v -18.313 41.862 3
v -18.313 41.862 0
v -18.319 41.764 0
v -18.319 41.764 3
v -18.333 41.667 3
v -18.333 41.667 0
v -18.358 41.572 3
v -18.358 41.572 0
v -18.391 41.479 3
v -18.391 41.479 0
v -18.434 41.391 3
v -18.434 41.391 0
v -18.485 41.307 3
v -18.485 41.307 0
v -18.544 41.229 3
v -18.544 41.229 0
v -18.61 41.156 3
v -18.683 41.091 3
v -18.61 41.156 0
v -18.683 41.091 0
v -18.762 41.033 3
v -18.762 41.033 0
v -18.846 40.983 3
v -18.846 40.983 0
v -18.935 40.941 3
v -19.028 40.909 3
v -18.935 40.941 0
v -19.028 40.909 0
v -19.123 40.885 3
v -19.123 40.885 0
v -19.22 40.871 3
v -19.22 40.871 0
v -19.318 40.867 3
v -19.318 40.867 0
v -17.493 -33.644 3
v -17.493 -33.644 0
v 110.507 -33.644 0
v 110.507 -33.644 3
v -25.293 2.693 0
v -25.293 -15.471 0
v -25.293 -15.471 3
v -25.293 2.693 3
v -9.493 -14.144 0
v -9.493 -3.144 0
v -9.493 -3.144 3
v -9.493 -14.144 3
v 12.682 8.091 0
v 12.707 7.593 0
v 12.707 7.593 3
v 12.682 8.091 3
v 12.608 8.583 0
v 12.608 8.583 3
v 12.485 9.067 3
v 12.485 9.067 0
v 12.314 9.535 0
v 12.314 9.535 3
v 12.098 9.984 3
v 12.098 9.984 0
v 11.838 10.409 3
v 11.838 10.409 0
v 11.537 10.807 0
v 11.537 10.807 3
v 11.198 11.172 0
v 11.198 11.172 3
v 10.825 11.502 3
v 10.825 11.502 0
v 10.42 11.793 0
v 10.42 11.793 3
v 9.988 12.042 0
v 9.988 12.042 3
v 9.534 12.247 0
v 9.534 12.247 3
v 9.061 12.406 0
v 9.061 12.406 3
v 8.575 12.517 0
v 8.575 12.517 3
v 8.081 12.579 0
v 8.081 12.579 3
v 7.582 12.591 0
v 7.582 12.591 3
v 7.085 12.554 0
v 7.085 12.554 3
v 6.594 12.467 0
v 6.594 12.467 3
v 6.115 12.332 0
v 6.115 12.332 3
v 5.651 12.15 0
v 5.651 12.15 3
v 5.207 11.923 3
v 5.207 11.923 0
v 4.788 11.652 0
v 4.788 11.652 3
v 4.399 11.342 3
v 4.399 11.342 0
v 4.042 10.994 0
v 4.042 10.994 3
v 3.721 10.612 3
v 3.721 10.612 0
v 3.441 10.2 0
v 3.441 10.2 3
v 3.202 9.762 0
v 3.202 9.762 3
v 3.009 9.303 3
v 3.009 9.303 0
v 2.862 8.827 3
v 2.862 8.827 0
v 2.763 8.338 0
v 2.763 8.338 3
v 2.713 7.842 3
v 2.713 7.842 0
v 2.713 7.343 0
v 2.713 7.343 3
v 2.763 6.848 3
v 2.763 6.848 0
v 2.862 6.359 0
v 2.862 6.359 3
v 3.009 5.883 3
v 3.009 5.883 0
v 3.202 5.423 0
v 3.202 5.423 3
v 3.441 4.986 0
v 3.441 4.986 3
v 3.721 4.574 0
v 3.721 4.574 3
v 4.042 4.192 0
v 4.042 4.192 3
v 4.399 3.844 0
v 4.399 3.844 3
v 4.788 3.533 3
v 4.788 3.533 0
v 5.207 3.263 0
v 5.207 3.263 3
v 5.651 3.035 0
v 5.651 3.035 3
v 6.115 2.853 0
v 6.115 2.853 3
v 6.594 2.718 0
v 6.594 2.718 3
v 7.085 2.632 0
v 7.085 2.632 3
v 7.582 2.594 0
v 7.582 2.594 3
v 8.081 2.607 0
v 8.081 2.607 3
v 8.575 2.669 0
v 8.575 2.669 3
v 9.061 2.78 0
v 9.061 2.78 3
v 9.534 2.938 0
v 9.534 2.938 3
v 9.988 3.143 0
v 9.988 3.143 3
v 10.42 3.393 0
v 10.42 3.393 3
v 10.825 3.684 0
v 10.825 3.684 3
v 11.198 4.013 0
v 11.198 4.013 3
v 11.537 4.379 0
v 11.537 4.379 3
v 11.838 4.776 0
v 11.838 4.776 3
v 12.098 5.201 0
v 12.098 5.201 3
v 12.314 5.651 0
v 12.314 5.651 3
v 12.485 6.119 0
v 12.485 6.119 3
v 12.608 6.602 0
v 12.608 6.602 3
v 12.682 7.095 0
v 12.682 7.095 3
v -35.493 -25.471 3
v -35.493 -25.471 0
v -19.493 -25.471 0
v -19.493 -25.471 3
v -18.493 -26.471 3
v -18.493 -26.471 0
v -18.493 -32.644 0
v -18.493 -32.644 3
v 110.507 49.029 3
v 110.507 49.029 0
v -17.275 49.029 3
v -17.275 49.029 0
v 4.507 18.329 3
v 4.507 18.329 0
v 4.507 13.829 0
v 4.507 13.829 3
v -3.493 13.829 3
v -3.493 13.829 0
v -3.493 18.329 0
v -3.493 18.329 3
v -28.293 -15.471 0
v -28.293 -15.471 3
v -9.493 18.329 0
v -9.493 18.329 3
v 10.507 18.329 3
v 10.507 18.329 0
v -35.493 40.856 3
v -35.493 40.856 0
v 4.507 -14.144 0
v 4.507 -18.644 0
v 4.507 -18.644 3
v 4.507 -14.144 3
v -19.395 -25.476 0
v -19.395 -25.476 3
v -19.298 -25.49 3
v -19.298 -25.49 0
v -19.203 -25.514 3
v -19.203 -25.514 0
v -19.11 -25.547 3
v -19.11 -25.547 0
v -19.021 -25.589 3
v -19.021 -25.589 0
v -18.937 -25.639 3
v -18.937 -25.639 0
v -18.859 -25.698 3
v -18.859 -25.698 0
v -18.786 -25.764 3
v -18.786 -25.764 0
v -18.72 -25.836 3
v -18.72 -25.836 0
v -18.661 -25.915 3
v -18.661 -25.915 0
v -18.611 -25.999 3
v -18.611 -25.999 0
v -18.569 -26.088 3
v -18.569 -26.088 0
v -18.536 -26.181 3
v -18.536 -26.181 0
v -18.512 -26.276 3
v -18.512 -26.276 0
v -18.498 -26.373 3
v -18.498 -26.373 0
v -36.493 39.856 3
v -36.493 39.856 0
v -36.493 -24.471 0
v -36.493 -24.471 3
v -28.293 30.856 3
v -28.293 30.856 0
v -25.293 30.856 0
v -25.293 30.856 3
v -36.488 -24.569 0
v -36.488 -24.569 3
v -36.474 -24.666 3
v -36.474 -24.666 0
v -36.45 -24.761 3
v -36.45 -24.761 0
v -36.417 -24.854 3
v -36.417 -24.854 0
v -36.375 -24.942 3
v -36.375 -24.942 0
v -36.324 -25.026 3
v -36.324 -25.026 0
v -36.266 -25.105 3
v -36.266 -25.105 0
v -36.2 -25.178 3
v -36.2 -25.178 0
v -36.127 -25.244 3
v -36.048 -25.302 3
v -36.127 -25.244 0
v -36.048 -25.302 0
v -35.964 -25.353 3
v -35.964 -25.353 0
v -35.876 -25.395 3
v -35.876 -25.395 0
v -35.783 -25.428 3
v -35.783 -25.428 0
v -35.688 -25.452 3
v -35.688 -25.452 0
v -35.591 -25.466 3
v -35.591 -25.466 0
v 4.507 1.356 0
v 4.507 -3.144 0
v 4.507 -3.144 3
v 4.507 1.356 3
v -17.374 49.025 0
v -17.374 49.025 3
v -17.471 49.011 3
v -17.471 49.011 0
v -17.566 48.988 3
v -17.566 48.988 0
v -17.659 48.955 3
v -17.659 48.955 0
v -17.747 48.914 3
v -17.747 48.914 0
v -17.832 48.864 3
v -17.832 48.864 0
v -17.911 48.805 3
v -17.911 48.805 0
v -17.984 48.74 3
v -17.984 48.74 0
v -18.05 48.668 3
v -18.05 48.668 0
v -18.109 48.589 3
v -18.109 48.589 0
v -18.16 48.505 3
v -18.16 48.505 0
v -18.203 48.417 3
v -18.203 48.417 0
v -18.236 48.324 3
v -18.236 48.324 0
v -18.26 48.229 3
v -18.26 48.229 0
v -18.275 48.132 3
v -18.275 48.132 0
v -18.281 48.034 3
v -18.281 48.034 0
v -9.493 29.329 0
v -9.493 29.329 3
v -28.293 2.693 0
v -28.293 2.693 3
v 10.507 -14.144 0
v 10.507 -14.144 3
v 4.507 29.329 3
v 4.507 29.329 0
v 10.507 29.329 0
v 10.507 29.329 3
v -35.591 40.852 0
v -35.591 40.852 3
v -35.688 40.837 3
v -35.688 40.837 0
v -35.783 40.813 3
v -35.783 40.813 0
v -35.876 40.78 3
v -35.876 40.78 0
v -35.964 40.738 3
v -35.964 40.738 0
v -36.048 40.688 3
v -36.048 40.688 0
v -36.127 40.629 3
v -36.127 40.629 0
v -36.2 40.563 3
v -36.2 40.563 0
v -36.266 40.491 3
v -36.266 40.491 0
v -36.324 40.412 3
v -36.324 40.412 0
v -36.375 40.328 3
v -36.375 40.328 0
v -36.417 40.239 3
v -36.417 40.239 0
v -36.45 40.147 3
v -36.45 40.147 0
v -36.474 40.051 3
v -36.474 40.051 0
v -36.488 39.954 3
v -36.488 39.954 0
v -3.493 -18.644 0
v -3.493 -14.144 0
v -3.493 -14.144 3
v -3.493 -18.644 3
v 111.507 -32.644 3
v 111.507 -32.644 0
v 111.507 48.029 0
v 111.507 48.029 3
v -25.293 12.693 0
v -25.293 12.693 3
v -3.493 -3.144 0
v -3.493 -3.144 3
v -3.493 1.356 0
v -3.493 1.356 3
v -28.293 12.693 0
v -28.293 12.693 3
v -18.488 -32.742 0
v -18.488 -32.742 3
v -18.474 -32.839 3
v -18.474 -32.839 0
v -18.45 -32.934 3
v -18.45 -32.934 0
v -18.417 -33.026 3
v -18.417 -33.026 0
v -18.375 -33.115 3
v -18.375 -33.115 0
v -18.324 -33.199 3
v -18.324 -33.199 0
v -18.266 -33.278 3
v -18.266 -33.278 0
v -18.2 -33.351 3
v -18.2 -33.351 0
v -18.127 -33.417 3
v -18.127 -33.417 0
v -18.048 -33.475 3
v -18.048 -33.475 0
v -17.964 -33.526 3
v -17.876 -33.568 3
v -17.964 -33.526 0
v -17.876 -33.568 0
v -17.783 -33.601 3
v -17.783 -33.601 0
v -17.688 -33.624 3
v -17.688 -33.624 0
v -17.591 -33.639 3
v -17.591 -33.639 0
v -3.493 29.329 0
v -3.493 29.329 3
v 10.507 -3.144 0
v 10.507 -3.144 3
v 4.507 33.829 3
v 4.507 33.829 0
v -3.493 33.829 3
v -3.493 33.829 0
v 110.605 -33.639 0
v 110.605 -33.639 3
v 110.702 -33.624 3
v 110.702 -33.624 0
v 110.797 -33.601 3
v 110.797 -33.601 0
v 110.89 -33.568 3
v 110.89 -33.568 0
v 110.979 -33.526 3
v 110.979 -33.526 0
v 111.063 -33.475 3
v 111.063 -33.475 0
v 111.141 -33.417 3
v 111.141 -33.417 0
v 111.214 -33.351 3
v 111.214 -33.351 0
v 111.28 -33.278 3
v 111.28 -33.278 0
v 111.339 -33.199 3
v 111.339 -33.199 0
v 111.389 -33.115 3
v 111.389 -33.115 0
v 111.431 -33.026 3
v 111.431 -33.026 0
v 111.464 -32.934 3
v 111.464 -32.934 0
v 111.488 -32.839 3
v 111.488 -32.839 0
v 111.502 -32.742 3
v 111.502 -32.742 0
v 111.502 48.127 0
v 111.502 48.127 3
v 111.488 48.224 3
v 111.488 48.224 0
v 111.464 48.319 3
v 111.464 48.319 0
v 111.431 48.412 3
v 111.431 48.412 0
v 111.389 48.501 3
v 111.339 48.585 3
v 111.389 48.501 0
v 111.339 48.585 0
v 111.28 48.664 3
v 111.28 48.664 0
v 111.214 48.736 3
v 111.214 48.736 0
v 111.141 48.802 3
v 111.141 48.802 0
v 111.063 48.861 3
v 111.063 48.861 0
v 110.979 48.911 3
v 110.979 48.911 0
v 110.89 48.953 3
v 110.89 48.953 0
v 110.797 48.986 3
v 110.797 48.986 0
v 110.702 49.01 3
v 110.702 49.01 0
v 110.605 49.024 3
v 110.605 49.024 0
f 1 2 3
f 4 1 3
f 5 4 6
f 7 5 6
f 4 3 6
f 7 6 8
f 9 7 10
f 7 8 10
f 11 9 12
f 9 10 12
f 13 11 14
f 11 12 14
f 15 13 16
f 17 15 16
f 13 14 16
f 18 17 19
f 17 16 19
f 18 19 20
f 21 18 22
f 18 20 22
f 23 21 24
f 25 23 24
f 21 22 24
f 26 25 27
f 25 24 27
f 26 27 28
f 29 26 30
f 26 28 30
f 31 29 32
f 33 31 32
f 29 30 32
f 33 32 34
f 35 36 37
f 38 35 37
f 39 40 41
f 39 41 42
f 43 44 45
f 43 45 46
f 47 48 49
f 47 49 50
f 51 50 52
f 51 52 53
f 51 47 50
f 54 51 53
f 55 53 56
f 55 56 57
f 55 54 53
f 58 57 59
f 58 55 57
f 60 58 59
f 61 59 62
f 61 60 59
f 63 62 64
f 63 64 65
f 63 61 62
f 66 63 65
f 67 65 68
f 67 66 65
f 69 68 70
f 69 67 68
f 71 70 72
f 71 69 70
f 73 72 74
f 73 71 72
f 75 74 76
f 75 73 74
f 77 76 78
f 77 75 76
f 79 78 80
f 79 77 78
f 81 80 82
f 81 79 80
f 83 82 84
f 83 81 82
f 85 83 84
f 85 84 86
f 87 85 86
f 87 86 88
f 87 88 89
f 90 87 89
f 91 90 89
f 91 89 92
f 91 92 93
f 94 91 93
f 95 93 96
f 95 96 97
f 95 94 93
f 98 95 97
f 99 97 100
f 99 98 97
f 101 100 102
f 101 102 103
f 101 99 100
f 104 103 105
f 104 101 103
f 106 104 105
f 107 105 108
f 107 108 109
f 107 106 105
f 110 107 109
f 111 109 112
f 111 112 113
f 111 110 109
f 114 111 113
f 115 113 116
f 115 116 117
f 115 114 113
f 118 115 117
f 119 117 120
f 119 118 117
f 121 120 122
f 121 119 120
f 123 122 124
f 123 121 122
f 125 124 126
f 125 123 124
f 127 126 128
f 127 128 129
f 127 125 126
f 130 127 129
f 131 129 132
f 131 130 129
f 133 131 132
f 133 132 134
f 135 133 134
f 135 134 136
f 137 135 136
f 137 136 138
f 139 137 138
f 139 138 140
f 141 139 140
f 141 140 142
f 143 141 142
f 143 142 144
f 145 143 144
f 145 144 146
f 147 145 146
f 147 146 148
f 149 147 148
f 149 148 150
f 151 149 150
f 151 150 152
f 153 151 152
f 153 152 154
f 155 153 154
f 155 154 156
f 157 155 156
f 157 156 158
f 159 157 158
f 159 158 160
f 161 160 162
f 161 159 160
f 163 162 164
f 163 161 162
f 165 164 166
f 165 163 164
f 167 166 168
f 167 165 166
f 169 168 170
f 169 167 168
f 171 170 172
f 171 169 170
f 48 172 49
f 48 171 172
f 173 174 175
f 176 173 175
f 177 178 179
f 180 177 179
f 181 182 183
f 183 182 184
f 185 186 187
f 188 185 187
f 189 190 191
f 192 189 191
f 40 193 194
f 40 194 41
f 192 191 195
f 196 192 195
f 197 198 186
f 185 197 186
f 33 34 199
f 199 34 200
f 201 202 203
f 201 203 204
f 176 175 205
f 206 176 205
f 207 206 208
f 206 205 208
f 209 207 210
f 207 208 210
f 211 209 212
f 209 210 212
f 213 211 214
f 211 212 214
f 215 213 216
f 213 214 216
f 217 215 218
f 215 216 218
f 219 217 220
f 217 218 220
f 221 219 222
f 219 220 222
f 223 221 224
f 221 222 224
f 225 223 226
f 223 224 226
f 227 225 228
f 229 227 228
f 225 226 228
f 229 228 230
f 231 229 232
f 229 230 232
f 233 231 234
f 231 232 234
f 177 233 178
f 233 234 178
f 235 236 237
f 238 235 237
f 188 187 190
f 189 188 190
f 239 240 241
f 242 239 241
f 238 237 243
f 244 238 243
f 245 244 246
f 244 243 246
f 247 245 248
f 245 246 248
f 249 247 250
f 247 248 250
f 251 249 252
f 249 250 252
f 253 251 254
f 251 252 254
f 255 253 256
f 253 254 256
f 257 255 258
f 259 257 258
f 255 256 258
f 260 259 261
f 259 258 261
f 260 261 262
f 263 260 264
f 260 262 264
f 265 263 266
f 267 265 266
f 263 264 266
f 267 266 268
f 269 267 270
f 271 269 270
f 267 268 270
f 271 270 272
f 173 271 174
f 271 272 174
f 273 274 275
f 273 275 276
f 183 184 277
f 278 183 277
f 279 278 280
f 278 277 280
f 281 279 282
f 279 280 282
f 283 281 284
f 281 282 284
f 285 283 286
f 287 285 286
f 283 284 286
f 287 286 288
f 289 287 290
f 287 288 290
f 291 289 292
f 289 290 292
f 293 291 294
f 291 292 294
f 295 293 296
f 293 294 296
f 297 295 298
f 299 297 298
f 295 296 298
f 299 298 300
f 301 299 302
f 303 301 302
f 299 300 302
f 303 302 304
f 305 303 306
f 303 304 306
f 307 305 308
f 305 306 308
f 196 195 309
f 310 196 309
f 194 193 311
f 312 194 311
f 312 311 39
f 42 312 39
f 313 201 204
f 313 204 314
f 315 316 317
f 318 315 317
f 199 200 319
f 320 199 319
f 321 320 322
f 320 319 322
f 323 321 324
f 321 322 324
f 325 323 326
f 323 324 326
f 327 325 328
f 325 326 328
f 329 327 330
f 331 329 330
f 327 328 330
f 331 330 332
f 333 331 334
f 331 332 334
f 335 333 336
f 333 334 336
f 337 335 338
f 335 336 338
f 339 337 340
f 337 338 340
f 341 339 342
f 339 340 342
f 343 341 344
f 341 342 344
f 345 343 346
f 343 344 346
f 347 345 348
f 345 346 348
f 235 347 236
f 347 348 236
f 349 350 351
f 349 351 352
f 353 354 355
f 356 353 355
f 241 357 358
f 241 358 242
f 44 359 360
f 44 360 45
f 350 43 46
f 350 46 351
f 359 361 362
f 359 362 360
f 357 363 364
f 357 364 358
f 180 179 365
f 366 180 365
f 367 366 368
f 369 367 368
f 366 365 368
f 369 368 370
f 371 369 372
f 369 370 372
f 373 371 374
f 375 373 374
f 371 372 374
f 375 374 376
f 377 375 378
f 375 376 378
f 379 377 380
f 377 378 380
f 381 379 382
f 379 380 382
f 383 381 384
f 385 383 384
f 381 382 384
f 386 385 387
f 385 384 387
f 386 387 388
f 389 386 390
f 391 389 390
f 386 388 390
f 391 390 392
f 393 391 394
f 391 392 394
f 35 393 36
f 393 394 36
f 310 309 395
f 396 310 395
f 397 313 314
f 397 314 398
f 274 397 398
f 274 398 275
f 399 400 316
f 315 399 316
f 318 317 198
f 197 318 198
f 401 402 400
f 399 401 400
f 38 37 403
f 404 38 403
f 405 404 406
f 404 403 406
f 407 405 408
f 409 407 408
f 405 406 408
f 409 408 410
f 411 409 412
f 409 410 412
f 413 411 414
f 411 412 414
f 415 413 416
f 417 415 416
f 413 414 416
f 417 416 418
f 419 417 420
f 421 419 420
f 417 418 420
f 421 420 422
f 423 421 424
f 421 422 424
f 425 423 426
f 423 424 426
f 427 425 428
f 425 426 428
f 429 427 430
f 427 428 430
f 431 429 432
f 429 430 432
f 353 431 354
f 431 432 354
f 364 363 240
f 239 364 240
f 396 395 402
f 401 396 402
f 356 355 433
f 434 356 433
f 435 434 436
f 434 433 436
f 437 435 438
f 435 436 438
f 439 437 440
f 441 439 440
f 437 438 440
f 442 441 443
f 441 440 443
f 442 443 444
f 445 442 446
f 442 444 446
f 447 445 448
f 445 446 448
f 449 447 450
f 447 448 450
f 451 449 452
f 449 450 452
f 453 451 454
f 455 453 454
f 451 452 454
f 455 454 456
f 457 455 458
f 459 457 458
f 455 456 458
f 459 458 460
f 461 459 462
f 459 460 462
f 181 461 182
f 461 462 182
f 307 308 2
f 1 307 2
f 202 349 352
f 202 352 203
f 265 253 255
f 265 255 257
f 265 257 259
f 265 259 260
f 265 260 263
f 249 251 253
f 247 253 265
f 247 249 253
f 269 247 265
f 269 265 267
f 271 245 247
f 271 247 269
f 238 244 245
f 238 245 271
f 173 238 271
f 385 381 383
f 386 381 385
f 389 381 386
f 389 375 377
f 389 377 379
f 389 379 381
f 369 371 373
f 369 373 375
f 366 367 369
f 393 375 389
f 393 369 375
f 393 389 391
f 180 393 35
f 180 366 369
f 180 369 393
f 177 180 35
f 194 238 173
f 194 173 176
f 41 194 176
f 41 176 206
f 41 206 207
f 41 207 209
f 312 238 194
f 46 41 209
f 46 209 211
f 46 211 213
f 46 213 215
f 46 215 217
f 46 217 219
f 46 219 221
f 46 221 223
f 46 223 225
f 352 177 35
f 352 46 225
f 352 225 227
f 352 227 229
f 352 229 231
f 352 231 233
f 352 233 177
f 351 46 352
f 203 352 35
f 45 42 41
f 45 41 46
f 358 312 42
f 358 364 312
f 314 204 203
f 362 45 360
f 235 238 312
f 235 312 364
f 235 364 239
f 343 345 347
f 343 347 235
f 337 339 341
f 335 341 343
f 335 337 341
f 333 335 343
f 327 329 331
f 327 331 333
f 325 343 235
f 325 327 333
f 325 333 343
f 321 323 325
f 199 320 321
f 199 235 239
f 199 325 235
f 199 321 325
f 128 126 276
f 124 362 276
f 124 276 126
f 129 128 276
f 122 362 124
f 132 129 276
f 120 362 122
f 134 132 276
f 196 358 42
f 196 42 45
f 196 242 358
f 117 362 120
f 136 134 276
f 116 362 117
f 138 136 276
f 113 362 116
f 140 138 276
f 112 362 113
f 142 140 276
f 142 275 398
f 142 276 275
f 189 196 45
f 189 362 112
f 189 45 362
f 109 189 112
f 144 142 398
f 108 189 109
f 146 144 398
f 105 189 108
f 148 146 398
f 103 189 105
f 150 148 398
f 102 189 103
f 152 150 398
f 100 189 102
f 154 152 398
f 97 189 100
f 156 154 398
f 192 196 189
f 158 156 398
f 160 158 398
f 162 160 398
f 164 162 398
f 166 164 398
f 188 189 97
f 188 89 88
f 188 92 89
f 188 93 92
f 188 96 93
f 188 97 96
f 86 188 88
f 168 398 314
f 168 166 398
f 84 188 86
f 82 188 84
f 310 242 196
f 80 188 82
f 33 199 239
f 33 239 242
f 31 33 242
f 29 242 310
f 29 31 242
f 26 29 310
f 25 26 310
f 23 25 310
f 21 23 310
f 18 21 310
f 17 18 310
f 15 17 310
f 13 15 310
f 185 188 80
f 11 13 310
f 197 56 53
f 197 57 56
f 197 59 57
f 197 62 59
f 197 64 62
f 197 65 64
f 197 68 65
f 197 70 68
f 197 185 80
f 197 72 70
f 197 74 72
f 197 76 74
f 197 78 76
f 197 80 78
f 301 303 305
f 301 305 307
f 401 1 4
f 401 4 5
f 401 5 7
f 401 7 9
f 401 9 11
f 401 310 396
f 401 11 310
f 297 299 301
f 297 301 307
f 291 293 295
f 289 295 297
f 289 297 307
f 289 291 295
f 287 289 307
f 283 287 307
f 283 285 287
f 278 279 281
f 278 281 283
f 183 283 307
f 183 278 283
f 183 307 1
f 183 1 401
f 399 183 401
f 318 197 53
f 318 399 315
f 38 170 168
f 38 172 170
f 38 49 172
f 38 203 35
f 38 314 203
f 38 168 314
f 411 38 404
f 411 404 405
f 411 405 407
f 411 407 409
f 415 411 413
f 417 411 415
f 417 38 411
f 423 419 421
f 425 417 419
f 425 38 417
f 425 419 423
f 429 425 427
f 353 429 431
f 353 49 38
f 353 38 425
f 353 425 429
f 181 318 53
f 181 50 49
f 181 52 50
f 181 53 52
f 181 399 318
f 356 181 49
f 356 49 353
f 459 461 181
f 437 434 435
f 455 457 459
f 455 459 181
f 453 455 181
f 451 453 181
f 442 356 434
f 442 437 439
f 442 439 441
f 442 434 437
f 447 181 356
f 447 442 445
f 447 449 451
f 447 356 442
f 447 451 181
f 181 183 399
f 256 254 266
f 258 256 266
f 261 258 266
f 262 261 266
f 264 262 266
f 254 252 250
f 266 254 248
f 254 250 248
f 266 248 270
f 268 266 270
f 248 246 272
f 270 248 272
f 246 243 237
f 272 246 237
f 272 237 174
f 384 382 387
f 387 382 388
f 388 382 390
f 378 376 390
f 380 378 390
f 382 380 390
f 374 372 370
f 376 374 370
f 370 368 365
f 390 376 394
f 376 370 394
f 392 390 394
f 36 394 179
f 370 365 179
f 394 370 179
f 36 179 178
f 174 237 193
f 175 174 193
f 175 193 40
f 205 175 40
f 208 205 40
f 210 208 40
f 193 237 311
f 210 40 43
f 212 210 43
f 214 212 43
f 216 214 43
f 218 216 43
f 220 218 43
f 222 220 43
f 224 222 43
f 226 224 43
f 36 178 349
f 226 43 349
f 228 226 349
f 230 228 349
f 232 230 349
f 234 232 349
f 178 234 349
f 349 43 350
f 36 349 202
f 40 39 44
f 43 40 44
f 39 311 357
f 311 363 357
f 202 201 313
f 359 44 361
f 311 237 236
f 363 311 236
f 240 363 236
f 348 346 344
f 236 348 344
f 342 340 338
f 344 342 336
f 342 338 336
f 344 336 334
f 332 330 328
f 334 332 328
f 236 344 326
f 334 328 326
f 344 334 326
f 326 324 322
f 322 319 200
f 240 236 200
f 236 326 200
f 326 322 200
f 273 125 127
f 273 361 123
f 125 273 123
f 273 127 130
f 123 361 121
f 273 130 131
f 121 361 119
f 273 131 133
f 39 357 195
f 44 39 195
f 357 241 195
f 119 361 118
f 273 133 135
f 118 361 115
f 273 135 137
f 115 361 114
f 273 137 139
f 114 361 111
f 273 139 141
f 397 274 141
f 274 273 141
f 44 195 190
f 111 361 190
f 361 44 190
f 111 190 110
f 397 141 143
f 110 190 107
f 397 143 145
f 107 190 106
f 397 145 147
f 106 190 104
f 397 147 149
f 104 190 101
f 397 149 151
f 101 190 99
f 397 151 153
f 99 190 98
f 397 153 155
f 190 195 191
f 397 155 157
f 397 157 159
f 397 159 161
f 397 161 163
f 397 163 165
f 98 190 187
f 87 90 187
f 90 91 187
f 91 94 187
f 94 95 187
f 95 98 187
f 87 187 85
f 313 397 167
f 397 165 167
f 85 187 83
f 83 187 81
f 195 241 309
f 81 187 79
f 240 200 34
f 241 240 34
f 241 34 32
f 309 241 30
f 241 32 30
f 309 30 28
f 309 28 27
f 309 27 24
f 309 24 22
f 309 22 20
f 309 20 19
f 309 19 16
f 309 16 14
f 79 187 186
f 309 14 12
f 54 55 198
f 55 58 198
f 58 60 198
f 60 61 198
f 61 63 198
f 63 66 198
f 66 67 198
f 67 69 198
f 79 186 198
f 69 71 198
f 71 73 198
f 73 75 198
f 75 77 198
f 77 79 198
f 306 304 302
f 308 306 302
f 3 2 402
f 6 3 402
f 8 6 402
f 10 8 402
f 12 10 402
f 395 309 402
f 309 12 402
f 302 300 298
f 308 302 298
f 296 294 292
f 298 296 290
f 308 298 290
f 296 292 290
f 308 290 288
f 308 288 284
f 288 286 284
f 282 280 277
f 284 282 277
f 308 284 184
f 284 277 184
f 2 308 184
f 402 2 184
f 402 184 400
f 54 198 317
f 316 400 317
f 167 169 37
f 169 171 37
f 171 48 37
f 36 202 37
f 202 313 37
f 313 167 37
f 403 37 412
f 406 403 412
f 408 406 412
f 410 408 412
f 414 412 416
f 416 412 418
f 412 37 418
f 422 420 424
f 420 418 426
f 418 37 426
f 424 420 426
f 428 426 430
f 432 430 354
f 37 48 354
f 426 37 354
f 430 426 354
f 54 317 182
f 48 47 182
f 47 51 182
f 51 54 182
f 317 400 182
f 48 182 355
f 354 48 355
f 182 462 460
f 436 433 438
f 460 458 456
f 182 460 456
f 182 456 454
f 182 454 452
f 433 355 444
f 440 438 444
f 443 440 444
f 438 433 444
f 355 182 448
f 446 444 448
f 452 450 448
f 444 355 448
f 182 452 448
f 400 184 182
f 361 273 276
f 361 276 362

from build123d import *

# Parameters (mm, degrees)
MODEL_R                 = 5
MODEL_W                 = 3
MODEL_H                 = 18.163611367
MODEL_H_2               = 18.163611368
SALIENTE_EXTRUIR1_DEPTH = 3


with BuildPart() as part:
    # Model → Saliente-Extruir1 (new body)
    with BuildSketch(Plane.XY):
        with BuildLine():
            Line((110.507104, 49.029117707), (-17.27548715, 49.029117707))
            ThreePointArc((-17.27548715, 49.029117707), (-17.98412567, 48.739950134), (-18.280736421, 48.034394679))
            Line((-18.280736421, 48.034394679), (-18.313224497, 41.861702909))
            ThreePointArc((-18.313224497, 41.861702909), (-18.609835248, 41.156147454), (-19.318473769, 40.866979881))
            Line((-19.318473769, 40.866979881), (-35.492896, 40.856340442))
            ThreePointArc((-35.492896, 40.856340442), (-36.200002781, 40.563447224), (-36.492896, 39.856340442))
            Line((-36.492896, 39.856340442), (-36.492896, -24.470882293))
            ThreePointArc((-36.492896, -24.470882293), (-36.200002781, -25.177989074), (-35.492896, -25.470882293))
            Line((-35.492896, -25.470882293), (-19.492896, -25.470882293))
            ThreePointArc((-19.492896, -25.470882293), (-18.785789219, -25.763775512), (-18.492896, -26.470882293))
            Line((-18.492896, -26.470882293), (-18.492896, -32.643659558))
            ThreePointArc((-18.492896, -32.643659558), (-18.200002781, -33.350766339), (-17.492896, -33.643659558))
            Line((-17.492896, -33.643659558), (26.507104, -33.643659558))
            Line((26.507104, -33.643659558), (32.507104, -33.643659558))
            Line((32.507104, -33.643659558), (65.191293724, -33.643659558))
            Line((65.191293724, -33.643659558), (110.507104, -33.643659558))
            ThreePointArc((110.507104, -33.643659558), (111.214210781, -33.350766339), (111.507104, -32.643659558))
            Line((111.507104, -32.643659558), (111.507104, 48.029117707))
            ThreePointArc((111.507104, 48.029117707), (111.214210781, 48.736224488), (110.507104, 49.029117707))
        make_face()
        with Locations((7.707104, 7.592729075)):
            Circle(MODEL_R, mode=Mode.SUBTRACT)
        Polygon((10.507104, 18.329117707), (4.507104, 18.329117707), (4.507104, 13.829117707), (-3.492896, 13.829117707), (-3.492896, 18.329117707), (-9.492896, 18.329117707), (-9.492896, 29.329117707), (-3.492896, 29.329117707), (-3.492896, 33.829117707), (4.507104, 33.829117707), (4.507104, 29.329117707), (10.507104, 29.329117707), align=None, mode=Mode.SUBTRACT)
        Polygon((10.507104, -3.143659558), (4.507104, -3.143659558), (4.507104, 1.356340442), (-3.492896, 1.356340442), (-3.492896, -3.143659558), (-9.492896, -3.143659558), (-9.492896, -14.143659558), (-3.492896, -14.143659558), (-3.492896, -18.643659558), (4.507104, -18.643659558), (4.507104, -14.143659558), (10.507104, -14.143659558), align=None, mode=Mode.SUBTRACT)
        with Locations((-26.792896, 21.774534758)):
            Rectangle(MODEL_W, MODEL_H, mode=Mode.SUBTRACT)
        with Locations((-26.792896, -6.389076609)):
            Rectangle(MODEL_W, MODEL_H_2, mode=Mode.SUBTRACT)
    extrude(amount=SALIENTE_EXTRUIR1_DEPTH)


solid = part.part
